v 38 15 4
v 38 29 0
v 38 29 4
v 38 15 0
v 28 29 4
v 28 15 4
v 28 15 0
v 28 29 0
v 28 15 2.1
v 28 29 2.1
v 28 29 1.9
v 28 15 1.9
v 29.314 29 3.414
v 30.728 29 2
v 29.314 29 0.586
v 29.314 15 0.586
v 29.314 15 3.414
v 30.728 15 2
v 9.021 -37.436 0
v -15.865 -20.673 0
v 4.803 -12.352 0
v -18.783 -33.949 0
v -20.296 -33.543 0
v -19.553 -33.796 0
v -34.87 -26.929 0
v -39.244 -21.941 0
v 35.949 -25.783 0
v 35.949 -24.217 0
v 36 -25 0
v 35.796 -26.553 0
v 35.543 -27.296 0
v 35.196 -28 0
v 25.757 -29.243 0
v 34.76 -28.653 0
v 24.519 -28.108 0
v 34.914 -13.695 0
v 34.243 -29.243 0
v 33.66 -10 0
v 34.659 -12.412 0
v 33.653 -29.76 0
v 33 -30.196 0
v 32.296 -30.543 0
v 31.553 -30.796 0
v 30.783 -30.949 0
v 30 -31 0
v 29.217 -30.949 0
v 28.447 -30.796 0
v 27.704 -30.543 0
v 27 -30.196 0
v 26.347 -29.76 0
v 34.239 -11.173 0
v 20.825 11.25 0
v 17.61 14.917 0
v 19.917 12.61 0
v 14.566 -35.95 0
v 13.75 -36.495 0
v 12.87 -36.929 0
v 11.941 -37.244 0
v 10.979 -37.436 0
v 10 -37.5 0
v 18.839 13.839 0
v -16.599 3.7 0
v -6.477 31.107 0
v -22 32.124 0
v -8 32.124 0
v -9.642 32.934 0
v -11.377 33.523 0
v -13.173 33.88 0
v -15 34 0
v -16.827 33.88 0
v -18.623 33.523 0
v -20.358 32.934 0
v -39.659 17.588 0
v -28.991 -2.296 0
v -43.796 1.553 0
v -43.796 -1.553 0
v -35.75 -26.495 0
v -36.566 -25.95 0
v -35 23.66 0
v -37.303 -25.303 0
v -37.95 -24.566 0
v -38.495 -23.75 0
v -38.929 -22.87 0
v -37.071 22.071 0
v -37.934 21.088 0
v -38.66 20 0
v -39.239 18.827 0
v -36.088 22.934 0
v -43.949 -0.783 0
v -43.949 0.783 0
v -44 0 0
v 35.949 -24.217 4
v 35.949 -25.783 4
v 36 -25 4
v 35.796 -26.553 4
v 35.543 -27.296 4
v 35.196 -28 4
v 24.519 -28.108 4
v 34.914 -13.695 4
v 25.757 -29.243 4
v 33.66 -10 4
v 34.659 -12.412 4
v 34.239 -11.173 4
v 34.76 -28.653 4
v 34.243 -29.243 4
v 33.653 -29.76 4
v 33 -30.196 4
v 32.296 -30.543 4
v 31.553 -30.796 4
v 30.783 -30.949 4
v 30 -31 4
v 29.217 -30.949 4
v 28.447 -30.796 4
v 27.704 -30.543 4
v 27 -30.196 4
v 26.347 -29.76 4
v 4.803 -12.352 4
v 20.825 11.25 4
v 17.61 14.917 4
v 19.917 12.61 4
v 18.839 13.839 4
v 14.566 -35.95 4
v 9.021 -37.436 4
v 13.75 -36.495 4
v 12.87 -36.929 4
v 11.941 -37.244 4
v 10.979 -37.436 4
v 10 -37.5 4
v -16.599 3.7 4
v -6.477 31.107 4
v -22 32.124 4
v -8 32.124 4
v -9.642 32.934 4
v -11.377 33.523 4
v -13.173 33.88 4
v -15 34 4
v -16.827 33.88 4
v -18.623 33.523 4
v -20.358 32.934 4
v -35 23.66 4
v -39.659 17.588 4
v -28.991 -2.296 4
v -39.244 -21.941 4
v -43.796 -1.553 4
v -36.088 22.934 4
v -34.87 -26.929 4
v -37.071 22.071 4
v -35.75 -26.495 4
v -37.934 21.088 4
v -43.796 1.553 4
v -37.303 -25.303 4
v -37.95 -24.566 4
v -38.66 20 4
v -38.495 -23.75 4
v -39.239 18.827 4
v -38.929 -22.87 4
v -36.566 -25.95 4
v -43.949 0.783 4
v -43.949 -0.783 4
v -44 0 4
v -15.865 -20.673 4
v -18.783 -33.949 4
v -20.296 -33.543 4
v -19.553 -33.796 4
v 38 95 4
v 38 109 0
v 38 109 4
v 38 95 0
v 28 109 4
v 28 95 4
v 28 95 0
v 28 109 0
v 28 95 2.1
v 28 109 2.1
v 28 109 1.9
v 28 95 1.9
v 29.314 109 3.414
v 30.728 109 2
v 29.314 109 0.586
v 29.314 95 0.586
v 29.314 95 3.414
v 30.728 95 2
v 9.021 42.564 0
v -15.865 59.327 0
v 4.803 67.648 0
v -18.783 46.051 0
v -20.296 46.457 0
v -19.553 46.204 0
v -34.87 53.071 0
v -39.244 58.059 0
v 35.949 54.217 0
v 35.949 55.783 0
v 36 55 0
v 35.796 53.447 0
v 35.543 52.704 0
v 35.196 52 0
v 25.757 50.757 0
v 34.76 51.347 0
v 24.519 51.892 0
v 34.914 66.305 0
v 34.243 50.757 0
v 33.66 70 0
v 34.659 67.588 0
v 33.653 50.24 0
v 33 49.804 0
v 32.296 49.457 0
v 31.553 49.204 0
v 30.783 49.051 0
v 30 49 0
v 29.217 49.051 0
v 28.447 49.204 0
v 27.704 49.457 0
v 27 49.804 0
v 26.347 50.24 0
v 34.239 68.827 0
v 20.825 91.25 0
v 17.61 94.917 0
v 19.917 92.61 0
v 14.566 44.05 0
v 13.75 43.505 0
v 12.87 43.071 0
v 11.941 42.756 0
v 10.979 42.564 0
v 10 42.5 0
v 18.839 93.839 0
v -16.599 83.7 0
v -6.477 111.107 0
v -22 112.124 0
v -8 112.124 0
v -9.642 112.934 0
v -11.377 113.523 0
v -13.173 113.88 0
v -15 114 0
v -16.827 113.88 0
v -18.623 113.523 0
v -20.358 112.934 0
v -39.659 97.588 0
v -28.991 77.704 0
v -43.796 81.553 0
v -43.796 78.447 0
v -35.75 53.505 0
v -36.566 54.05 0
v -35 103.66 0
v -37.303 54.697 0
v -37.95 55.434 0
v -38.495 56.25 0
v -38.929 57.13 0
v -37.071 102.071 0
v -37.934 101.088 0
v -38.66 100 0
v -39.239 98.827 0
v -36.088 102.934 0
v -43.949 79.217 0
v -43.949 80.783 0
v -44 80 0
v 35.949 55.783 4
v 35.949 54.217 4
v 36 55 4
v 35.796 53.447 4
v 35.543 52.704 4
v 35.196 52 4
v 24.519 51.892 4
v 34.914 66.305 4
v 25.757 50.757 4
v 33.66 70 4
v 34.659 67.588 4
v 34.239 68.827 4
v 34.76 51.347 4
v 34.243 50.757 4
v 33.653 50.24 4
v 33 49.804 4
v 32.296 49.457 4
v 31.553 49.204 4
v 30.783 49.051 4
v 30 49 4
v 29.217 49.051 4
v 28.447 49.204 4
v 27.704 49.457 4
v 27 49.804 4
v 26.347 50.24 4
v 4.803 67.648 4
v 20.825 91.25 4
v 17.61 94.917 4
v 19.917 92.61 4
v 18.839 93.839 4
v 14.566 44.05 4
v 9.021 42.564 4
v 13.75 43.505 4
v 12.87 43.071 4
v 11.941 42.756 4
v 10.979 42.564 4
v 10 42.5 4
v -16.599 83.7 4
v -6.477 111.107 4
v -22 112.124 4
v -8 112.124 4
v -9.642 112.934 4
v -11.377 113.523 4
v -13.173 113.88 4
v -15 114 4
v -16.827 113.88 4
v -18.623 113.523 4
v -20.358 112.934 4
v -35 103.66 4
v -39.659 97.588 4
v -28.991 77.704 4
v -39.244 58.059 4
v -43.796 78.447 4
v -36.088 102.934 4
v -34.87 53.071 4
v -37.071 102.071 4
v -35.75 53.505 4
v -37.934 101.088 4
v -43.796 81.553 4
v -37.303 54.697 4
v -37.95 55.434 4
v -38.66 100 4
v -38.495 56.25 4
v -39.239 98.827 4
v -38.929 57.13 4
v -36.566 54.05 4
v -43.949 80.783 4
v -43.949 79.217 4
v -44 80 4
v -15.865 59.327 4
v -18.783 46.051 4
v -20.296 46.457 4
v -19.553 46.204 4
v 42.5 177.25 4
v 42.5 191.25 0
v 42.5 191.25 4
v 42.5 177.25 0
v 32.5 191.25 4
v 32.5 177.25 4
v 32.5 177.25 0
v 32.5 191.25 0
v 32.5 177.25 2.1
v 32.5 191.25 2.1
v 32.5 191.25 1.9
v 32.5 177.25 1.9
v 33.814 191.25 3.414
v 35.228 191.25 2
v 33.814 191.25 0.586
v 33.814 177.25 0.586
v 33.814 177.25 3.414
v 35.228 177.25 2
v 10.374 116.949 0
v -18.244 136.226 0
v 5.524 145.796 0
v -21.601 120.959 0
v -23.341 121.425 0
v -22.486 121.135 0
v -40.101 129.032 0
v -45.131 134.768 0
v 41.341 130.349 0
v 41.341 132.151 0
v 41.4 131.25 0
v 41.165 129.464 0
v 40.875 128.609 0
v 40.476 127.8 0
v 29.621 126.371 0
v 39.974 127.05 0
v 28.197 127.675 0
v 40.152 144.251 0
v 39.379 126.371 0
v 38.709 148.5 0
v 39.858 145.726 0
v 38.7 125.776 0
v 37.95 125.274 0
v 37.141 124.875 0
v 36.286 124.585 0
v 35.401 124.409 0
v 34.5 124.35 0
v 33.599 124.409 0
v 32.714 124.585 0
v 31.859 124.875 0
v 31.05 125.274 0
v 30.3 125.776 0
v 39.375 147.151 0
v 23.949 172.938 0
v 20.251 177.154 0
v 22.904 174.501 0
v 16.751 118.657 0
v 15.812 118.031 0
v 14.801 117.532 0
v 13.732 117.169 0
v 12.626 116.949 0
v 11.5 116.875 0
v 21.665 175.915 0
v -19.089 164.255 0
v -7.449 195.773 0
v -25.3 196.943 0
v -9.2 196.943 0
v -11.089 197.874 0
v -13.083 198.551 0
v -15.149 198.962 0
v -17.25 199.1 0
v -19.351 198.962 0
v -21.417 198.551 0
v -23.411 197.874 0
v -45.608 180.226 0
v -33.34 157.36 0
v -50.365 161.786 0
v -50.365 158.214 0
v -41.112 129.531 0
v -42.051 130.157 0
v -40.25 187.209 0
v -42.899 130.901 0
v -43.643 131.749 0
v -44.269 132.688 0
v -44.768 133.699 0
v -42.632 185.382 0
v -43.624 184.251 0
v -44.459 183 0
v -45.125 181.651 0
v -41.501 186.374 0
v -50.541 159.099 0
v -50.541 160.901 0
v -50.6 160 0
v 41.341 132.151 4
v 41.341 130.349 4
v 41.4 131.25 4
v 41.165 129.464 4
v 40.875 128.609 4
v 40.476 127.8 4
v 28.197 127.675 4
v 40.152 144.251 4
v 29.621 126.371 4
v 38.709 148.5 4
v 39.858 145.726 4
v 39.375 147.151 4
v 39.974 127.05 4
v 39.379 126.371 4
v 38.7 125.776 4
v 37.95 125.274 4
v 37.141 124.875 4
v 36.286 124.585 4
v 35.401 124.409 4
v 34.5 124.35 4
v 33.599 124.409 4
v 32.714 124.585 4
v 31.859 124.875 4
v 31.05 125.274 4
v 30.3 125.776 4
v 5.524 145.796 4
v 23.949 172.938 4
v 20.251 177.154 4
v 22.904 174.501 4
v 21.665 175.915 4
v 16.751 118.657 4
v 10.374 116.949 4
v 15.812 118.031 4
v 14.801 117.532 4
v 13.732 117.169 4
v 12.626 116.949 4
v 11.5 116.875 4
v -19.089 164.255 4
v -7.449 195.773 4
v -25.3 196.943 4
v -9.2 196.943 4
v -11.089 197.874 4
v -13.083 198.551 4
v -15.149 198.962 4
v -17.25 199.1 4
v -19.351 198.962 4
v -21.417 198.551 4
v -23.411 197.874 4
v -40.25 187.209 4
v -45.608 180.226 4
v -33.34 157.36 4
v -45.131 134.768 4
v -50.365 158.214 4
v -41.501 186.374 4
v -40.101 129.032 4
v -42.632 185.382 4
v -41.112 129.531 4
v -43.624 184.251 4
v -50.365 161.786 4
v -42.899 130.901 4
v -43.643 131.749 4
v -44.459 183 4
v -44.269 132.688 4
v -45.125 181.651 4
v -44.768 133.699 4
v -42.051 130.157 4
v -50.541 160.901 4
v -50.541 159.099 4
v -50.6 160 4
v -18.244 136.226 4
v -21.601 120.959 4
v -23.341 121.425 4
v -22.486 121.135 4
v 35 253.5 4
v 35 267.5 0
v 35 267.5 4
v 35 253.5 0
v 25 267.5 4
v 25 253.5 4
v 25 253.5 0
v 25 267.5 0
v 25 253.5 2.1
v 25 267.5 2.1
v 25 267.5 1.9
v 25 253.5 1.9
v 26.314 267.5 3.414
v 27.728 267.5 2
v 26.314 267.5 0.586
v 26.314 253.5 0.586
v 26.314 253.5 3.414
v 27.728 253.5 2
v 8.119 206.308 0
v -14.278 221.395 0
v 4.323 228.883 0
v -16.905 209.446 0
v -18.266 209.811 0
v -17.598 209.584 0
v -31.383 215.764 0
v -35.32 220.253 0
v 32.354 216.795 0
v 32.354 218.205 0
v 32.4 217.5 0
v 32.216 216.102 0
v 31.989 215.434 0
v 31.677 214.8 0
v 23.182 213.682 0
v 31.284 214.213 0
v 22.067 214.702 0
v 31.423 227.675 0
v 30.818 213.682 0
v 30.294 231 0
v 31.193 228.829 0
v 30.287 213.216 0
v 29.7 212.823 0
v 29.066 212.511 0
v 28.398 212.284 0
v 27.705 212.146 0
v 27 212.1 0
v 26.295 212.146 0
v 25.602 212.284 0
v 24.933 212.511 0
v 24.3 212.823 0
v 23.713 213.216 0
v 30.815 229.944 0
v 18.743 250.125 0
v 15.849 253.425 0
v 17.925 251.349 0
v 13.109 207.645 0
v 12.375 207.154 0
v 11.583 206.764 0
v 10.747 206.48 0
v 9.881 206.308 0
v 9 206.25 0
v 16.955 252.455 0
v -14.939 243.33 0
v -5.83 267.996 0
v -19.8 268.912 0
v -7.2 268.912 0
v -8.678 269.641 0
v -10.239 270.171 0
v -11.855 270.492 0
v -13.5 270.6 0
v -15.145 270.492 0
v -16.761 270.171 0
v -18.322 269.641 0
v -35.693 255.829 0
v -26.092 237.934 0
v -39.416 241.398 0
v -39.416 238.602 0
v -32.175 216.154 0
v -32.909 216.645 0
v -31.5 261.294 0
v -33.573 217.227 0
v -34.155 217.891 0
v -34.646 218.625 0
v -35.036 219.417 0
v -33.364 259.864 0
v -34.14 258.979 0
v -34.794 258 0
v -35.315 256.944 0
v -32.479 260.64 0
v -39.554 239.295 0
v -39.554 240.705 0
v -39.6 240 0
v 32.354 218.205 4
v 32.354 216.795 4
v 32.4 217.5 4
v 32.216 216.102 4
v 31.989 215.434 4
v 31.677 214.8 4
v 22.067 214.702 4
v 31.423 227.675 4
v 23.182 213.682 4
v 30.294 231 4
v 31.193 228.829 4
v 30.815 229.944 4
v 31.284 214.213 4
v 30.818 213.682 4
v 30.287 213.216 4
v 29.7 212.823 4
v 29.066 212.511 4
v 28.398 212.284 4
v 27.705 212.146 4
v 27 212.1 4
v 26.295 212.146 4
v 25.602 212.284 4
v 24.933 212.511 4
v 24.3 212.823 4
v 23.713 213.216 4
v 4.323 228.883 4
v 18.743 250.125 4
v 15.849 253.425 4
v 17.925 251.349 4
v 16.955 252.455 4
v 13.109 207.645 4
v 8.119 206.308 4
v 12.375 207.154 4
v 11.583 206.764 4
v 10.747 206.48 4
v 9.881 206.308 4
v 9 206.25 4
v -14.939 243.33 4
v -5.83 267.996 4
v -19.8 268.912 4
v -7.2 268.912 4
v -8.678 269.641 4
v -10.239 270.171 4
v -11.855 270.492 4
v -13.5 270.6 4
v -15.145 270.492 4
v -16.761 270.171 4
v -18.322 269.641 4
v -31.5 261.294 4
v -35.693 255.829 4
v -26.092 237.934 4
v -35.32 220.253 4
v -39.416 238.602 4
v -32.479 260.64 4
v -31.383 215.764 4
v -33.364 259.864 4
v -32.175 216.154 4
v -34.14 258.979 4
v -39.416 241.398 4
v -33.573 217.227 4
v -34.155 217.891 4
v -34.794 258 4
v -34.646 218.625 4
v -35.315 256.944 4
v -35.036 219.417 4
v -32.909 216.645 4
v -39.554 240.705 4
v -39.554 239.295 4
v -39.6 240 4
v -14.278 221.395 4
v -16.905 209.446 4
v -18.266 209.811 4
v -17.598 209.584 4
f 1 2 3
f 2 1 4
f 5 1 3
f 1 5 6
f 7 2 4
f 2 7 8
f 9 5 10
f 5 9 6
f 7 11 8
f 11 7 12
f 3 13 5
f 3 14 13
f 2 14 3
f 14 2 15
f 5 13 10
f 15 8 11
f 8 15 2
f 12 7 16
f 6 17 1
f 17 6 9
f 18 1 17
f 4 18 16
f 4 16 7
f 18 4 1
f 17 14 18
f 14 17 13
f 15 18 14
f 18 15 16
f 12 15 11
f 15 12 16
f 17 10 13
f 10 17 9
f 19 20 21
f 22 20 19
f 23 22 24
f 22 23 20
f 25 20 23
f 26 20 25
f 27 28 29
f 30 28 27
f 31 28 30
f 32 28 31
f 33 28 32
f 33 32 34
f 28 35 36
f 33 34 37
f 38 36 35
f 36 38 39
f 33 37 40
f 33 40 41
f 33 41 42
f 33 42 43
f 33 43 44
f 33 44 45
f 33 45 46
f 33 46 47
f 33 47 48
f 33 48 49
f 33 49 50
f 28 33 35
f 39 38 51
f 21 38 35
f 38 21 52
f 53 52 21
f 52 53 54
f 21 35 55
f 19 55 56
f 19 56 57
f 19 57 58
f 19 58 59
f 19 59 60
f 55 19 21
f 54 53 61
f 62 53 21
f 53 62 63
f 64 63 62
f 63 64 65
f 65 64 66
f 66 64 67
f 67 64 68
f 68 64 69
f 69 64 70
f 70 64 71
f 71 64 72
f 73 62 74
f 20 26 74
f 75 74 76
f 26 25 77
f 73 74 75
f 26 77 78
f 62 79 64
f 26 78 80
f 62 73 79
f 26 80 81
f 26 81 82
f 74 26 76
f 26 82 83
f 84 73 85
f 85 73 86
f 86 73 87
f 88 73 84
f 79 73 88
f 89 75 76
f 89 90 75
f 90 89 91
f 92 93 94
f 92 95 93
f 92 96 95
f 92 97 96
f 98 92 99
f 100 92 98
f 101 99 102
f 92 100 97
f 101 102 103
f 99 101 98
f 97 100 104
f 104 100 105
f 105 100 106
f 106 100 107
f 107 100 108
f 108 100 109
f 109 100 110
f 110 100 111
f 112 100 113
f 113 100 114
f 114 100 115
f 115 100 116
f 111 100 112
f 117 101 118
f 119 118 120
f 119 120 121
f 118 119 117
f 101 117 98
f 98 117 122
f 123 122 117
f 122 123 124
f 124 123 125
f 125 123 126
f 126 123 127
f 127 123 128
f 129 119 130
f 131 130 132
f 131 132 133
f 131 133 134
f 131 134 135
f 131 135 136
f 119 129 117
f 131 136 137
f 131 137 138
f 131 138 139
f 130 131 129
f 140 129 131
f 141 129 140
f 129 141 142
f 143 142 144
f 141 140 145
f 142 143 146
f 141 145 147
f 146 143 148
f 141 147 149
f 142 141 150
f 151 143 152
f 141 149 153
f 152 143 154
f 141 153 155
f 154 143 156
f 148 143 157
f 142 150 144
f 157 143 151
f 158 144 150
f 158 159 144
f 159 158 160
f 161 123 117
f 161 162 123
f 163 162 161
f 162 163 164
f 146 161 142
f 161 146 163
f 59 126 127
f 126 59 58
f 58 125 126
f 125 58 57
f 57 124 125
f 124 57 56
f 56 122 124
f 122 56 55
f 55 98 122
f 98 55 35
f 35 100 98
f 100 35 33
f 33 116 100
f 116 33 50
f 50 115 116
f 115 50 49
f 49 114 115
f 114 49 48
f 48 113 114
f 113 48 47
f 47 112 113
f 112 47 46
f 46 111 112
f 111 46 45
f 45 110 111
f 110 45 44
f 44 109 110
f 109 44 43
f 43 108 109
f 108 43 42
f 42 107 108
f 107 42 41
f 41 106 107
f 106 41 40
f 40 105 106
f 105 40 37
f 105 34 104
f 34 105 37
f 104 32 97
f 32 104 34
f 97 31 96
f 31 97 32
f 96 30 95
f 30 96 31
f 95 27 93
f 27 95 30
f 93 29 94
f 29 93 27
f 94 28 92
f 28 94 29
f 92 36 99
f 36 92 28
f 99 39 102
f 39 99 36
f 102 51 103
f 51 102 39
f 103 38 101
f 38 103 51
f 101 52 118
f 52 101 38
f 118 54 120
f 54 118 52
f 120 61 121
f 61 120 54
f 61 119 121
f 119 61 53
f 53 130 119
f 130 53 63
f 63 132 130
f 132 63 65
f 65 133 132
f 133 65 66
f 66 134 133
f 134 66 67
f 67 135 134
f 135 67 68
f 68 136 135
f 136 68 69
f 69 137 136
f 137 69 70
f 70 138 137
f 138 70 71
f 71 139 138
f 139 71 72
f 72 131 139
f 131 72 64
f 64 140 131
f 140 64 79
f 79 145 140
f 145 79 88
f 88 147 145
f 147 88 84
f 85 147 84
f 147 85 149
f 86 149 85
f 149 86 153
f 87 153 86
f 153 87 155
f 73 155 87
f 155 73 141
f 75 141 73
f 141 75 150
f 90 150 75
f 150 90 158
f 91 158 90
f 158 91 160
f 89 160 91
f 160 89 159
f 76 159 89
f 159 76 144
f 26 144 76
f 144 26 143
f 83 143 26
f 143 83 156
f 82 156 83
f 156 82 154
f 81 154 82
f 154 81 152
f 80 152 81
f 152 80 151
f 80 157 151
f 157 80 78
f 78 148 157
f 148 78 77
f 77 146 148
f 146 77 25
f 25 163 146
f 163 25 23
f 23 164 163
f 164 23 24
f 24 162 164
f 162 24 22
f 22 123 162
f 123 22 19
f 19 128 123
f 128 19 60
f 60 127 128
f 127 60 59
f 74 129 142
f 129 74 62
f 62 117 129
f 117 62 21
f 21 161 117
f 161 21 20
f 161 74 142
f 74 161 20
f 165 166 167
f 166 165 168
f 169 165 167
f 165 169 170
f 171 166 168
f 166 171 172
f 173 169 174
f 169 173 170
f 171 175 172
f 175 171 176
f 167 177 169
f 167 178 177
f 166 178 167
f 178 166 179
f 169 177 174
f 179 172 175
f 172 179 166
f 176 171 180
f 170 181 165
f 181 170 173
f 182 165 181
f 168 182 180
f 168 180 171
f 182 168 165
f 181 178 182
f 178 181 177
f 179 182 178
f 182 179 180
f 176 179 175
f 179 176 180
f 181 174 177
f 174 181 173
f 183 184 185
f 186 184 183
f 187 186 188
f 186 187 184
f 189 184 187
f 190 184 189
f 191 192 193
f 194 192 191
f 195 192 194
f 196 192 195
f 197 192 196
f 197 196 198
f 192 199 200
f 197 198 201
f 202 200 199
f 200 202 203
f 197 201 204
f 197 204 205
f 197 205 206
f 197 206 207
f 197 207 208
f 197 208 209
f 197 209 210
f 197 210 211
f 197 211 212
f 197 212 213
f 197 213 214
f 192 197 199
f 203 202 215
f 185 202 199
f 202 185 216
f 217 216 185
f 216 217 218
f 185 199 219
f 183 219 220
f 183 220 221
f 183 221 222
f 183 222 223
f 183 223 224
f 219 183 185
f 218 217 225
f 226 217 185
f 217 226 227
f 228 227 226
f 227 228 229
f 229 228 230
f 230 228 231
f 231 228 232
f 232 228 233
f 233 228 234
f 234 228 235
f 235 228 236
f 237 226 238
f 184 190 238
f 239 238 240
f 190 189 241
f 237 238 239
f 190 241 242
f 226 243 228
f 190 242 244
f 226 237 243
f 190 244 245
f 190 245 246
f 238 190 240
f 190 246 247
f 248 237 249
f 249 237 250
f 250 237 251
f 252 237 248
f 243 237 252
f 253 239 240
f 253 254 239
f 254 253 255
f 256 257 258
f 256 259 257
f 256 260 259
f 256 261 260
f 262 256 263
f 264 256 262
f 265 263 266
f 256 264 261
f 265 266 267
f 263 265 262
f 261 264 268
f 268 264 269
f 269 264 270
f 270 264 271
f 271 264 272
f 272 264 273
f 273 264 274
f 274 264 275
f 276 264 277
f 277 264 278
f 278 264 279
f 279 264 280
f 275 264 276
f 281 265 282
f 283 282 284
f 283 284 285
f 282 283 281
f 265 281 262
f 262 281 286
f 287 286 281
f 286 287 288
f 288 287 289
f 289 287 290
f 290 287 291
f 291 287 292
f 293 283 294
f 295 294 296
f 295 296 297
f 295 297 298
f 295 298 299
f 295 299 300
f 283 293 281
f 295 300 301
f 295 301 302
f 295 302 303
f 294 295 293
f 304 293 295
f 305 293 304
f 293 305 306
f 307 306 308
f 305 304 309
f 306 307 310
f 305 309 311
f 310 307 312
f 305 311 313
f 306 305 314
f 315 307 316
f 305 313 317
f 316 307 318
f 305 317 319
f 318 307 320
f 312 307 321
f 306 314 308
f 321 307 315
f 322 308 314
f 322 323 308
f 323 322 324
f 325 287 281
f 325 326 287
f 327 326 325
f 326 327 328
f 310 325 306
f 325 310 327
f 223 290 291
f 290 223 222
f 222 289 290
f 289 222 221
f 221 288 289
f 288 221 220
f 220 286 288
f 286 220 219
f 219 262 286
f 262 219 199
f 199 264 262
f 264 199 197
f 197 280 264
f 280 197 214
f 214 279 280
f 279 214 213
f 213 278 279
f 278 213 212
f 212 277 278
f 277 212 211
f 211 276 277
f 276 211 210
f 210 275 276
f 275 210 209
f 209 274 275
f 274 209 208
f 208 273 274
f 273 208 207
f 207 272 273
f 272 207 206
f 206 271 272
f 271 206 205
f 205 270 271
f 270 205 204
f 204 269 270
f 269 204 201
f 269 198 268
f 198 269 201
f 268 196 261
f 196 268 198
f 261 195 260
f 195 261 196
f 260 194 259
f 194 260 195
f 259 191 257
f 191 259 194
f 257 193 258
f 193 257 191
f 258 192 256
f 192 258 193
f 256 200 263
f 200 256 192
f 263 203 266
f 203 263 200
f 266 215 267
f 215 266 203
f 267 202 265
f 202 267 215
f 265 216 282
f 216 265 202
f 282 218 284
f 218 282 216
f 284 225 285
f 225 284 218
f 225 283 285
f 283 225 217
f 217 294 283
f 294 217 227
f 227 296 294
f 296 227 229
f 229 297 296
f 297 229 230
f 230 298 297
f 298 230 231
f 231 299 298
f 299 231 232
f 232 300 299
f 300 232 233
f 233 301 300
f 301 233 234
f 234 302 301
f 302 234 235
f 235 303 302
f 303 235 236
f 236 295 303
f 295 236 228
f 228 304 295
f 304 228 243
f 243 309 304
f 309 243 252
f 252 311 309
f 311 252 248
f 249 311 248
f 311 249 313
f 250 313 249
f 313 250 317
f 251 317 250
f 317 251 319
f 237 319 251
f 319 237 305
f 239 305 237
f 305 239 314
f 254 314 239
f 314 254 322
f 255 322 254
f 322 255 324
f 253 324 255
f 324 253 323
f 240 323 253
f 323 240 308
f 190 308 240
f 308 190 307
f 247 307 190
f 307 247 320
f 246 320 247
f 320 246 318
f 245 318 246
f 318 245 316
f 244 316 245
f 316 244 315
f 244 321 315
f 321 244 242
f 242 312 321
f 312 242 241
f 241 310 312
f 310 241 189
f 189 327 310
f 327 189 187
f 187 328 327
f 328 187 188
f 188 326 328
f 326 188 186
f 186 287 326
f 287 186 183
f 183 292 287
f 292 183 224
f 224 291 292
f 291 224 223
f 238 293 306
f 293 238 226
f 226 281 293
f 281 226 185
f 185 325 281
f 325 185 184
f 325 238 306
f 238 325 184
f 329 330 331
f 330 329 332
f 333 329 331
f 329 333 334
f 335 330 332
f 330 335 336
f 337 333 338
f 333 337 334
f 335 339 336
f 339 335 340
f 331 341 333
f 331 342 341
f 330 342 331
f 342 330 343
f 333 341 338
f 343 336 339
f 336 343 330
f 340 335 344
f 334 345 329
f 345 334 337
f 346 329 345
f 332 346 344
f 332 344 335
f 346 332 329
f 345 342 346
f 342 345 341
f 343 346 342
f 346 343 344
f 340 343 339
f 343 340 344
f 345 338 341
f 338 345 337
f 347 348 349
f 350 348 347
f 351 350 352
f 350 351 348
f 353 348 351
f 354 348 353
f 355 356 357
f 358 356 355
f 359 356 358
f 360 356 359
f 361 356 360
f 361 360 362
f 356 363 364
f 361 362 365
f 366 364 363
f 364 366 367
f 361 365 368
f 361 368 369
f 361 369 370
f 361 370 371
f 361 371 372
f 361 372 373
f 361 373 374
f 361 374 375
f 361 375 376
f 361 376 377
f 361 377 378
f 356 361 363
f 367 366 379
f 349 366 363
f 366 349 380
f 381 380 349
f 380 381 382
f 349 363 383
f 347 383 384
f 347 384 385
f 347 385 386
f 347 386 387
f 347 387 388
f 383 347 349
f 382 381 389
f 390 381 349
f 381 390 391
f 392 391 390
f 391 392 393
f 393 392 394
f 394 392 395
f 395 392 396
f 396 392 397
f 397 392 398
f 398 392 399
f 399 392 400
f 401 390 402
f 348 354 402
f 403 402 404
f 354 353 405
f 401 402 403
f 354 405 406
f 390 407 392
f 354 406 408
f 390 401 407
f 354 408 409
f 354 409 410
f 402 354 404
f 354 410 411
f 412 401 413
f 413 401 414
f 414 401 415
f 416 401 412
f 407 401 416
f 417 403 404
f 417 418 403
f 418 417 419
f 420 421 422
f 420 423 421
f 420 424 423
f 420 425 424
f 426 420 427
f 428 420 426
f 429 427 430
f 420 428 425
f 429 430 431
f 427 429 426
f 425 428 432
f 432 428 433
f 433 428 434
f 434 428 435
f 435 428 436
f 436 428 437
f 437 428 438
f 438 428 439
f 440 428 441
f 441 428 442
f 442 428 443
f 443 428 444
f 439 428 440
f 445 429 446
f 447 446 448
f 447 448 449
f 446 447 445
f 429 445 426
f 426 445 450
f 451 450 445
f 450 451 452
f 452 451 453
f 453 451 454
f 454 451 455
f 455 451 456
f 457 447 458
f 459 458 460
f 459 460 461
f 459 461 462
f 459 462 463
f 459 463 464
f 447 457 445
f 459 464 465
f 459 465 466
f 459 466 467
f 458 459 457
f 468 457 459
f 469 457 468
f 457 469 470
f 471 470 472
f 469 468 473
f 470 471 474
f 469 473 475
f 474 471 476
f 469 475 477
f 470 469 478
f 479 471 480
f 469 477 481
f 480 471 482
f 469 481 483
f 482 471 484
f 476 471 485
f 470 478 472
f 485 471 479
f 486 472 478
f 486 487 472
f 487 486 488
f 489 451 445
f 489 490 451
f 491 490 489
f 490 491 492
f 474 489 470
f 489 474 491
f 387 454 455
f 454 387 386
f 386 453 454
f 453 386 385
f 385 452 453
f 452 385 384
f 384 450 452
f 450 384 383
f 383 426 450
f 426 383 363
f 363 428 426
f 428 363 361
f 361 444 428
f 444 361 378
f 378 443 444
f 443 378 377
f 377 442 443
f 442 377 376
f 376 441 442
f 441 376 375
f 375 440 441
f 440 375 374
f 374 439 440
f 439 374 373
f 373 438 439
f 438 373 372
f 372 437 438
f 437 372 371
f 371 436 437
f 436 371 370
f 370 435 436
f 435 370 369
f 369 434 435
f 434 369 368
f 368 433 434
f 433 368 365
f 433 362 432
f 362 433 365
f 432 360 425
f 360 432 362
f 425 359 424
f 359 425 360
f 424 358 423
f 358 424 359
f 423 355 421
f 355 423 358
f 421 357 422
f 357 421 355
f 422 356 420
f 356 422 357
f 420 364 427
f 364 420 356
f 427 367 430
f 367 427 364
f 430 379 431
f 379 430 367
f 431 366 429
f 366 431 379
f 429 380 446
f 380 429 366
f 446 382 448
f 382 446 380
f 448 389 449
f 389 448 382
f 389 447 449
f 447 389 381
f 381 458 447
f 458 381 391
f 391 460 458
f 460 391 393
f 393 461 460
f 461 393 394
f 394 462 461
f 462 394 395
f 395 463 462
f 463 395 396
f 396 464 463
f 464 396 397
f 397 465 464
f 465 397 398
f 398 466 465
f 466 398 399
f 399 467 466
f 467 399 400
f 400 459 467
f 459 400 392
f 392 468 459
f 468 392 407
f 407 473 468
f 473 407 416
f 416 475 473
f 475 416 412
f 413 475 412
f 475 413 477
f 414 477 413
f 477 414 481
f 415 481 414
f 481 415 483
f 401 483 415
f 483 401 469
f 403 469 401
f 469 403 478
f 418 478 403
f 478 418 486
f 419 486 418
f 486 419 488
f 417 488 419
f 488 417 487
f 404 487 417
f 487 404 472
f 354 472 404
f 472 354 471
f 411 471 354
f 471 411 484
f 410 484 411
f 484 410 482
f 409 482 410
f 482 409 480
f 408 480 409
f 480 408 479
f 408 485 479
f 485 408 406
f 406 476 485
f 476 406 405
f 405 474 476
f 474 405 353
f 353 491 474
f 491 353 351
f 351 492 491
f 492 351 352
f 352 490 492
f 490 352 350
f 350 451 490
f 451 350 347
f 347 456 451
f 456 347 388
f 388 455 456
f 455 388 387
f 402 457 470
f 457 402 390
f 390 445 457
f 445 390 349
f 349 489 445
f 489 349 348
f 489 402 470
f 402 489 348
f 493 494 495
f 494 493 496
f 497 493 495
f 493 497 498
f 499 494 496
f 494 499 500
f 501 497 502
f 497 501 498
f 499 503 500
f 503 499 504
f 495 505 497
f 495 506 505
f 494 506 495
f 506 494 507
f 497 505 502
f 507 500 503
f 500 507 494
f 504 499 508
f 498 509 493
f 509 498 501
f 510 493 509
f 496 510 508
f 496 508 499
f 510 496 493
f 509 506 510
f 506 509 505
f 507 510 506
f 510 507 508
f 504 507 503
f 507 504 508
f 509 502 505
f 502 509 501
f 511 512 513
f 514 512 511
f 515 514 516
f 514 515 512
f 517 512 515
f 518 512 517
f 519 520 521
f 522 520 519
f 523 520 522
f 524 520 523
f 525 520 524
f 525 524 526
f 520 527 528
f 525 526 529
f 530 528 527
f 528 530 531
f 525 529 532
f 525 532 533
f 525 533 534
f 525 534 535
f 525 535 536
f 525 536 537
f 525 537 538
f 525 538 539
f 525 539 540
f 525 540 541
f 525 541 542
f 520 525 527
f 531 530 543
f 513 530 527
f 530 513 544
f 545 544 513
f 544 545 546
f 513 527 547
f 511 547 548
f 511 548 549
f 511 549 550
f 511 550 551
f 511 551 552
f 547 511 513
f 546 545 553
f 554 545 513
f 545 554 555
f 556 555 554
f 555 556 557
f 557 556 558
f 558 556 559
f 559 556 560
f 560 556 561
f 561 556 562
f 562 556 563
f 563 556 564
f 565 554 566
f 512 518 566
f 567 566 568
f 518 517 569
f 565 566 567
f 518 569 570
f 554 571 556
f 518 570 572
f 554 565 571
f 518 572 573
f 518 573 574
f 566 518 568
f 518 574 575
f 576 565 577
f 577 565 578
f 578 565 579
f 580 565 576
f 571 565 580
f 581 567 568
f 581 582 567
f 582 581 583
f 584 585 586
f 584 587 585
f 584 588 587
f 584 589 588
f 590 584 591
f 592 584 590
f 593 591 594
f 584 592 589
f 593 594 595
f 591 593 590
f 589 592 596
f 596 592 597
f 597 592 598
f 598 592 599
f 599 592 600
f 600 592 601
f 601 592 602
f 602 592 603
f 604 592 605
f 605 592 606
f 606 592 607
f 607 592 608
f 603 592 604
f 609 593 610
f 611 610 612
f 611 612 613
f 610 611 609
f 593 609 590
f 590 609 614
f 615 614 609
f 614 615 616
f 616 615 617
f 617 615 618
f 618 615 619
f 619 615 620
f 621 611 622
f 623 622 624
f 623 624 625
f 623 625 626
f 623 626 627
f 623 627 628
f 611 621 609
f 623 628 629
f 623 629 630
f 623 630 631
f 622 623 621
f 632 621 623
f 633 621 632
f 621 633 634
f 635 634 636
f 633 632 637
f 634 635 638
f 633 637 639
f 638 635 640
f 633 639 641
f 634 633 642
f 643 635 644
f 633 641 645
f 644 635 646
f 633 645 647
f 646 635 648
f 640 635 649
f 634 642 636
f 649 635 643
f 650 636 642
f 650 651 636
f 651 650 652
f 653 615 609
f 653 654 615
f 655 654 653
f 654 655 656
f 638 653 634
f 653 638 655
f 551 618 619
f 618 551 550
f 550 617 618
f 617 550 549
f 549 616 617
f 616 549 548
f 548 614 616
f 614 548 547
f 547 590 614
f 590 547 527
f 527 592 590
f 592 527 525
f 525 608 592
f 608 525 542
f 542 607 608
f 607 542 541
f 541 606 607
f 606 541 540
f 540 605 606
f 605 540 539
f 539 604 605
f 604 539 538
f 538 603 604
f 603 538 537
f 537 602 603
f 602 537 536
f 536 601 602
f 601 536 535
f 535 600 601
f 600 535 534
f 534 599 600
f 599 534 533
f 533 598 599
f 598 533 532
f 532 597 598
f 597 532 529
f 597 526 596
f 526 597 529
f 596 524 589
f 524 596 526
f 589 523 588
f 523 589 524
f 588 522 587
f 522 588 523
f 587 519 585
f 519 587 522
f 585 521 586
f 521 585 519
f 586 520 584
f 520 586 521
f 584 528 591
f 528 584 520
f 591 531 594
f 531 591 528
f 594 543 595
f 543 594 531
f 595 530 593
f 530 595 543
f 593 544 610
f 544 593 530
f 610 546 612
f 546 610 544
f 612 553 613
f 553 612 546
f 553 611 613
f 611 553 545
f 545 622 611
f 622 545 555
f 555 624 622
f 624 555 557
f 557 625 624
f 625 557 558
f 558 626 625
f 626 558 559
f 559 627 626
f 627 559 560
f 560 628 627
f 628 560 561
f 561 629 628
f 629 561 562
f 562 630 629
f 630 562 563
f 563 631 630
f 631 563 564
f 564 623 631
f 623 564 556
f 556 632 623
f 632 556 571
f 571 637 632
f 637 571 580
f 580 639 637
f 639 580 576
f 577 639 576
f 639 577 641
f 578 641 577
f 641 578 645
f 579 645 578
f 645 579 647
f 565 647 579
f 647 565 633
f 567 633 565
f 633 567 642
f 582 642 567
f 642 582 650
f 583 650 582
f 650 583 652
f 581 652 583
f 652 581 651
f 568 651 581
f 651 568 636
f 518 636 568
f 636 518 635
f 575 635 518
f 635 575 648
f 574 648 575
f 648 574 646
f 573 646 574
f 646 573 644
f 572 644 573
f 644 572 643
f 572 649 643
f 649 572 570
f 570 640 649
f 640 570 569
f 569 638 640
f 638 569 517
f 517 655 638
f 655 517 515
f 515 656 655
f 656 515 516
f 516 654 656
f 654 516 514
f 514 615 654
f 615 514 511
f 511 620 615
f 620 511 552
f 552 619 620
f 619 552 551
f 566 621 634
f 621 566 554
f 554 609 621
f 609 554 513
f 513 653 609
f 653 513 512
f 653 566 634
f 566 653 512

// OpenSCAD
/*
 * WAVE LAYER: BODY (Layer 2 - Backmost)
 * =====================================
 *
 * Dark blue, largest shape, smooth wave curve
 * 2D profile extruded to 4mm thickness
 * Mounting tab on right edge for slider connection
 *
 * Print: 3x (one per wave)
 * Material: Any color PLA/PETG
 * Layer height: 0.2mm
 * Infill: 15%
 */

include <../common.scad>

// ============================================
// BODY PROFILE PARAMETERS
// ============================================

// Base dimensions (before scaling)
BODY_WIDTH = 60;           // X extent
BODY_HEIGHT = 50;          // Z extent (when upright)

// Tab position on profile (where slider attaches)
TAB_ATTACH_Z = 15;         // Height above profile bottom

// ============================================
// MAIN MODULE - BODY LAYER
// ============================================

module wave_layer_body(scale = 1.0) {
    /*
     * Complete body layer with mounting tab
     * Oriented for printing: flat on build plate
     * Assembly: rotate 90 degrees to stand upright
     */

    color(C_BODY)
    union() {
        // Main wave profile
        linear_extrude(height = LAYER_THICKNESS)
            body_profile_2d(scale);

        // Mounting tab (integral with profile)
        translate([BODY_WIDTH/2 * scale - 2, TAB_ATTACH_Z * scale, 0])
            mounting_tab(scale);
    }
}

// ============================================
// 2D BODY PROFILE
// ============================================

module body_profile_2d(scale = 1.0) {
    /*
     * Hokusai wave body shape
     * Largest, most solid layer
     * Smooth curves representing main wave mass
     */

    s = scale;

    scale([s, s])
    union() {
        // Main wave mass - rising face
        hull() {
            translate([25, -15]) circle(d = 20);
            translate([10, 5]) circle(d = 25);
            translate([-15, 20]) circle(d = 28);
        }

        // Upper curve - crest area
        hull() {
            translate([-15, 20]) circle(d = 28);
            translate([-30, 15]) circle(d = 20);
            translate([-38, 0]) circle(d = 12);
        }

        // Trough connection
        hull() {
            translate([-38, 0]) circle(d = 12);
            translate([-32, -20]) circle(d = 15);
            translate([-18, -28]) circle(d = 12);
        }

        // Base extension (wave trough)
        hull() {
            translate([25, -15]) circle(d = 20);
            translate([30, -25]) circle(d = 12);
        }

        // Connect all into solid mass
        hull() {
            translate([-18, -28]) circle(d = 12);
            translate([10, -30]) circle(d = 15);
            translate([25, -15]) circle(d = 20);
        }
    }
}

// ============================================
// MOUNTING TAB
// ============================================

module mounting_tab(scale = 1.0) {
    /*
     * Tab that inserts into slider slot
     * Provides rigid connection to slider mechanism
     */

    tab_width = PROFILE_TAB_WIDTH;
    tab_height = PROFILE_TAB_HEIGHT;
    tab_thick = LAYER_THICKNESS;

    // Tab body
    difference() {
        cube([tab_width, tab_height, tab_thick]);

        // Chamfer entry edge for easy insertion
        translate([-0.1, -0.1, tab_thick/2])
        rotate([0, 45, 0])
            cube([2, tab_height + 0.2, 2]);
    }

    // Retention bump (snap fit)
    translate([tab_width - 2, tab_height/2, tab_thick/2])
    rotate([90, 0, 0])
        cylinder(d = 1.5, h = 4, center = true, $fn = 12);
}

// ============================================
// BODY LAYER FOR SPECIFIC WAVE
// ============================================

module body_layer_wave(wave_num) {
    /*
     * Body layer scaled for specific wave number
     */
    wave_layer_body(wave_scale(wave_num));
}

// ============================================
// PRINTABLE ORIENTATION
// ============================================

module body_layer_printable(scale = 1.0) {
    /*
     * Oriented flat for 3D printing
     * Profile lies in XY plane, thickness in Z
     */
    wave_layer_body(scale);
}

// ============================================
// RENDER PREVIEW
// ============================================

// Show single layer
wave_layer_body(1.0);

// Show all three wave variants
translate([0, 80, 0]) {
    echo("Wave 0 (scale 1.0):");
    body_layer_wave(0);
}

translate([0, 160, 0]) {
    echo("Wave 1 (scale 1.15):");
    body_layer_wave(1);
}

translate([0, 240, 0]) {
    echo("Wave 2 (scale 0.9):");
    body_layer_wave(2);
}

// Info
echo("============================================");
echo("WAVE LAYER: BODY");
echo("============================================");
echo(str("Profile thickness: ", LAYER_THICKNESS, "mm"));
echo(str("Base dimensions: ~", BODY_WIDTH, " x ", BODY_HEIGHT, "mm"));
echo(str("Tab size: ", PROFILE_TAB_WIDTH, " x ", PROFILE_TAB_HEIGHT, "mm"));
echo("Print: 3 copies (one per wave, at different scales)");
echo("============================================");
